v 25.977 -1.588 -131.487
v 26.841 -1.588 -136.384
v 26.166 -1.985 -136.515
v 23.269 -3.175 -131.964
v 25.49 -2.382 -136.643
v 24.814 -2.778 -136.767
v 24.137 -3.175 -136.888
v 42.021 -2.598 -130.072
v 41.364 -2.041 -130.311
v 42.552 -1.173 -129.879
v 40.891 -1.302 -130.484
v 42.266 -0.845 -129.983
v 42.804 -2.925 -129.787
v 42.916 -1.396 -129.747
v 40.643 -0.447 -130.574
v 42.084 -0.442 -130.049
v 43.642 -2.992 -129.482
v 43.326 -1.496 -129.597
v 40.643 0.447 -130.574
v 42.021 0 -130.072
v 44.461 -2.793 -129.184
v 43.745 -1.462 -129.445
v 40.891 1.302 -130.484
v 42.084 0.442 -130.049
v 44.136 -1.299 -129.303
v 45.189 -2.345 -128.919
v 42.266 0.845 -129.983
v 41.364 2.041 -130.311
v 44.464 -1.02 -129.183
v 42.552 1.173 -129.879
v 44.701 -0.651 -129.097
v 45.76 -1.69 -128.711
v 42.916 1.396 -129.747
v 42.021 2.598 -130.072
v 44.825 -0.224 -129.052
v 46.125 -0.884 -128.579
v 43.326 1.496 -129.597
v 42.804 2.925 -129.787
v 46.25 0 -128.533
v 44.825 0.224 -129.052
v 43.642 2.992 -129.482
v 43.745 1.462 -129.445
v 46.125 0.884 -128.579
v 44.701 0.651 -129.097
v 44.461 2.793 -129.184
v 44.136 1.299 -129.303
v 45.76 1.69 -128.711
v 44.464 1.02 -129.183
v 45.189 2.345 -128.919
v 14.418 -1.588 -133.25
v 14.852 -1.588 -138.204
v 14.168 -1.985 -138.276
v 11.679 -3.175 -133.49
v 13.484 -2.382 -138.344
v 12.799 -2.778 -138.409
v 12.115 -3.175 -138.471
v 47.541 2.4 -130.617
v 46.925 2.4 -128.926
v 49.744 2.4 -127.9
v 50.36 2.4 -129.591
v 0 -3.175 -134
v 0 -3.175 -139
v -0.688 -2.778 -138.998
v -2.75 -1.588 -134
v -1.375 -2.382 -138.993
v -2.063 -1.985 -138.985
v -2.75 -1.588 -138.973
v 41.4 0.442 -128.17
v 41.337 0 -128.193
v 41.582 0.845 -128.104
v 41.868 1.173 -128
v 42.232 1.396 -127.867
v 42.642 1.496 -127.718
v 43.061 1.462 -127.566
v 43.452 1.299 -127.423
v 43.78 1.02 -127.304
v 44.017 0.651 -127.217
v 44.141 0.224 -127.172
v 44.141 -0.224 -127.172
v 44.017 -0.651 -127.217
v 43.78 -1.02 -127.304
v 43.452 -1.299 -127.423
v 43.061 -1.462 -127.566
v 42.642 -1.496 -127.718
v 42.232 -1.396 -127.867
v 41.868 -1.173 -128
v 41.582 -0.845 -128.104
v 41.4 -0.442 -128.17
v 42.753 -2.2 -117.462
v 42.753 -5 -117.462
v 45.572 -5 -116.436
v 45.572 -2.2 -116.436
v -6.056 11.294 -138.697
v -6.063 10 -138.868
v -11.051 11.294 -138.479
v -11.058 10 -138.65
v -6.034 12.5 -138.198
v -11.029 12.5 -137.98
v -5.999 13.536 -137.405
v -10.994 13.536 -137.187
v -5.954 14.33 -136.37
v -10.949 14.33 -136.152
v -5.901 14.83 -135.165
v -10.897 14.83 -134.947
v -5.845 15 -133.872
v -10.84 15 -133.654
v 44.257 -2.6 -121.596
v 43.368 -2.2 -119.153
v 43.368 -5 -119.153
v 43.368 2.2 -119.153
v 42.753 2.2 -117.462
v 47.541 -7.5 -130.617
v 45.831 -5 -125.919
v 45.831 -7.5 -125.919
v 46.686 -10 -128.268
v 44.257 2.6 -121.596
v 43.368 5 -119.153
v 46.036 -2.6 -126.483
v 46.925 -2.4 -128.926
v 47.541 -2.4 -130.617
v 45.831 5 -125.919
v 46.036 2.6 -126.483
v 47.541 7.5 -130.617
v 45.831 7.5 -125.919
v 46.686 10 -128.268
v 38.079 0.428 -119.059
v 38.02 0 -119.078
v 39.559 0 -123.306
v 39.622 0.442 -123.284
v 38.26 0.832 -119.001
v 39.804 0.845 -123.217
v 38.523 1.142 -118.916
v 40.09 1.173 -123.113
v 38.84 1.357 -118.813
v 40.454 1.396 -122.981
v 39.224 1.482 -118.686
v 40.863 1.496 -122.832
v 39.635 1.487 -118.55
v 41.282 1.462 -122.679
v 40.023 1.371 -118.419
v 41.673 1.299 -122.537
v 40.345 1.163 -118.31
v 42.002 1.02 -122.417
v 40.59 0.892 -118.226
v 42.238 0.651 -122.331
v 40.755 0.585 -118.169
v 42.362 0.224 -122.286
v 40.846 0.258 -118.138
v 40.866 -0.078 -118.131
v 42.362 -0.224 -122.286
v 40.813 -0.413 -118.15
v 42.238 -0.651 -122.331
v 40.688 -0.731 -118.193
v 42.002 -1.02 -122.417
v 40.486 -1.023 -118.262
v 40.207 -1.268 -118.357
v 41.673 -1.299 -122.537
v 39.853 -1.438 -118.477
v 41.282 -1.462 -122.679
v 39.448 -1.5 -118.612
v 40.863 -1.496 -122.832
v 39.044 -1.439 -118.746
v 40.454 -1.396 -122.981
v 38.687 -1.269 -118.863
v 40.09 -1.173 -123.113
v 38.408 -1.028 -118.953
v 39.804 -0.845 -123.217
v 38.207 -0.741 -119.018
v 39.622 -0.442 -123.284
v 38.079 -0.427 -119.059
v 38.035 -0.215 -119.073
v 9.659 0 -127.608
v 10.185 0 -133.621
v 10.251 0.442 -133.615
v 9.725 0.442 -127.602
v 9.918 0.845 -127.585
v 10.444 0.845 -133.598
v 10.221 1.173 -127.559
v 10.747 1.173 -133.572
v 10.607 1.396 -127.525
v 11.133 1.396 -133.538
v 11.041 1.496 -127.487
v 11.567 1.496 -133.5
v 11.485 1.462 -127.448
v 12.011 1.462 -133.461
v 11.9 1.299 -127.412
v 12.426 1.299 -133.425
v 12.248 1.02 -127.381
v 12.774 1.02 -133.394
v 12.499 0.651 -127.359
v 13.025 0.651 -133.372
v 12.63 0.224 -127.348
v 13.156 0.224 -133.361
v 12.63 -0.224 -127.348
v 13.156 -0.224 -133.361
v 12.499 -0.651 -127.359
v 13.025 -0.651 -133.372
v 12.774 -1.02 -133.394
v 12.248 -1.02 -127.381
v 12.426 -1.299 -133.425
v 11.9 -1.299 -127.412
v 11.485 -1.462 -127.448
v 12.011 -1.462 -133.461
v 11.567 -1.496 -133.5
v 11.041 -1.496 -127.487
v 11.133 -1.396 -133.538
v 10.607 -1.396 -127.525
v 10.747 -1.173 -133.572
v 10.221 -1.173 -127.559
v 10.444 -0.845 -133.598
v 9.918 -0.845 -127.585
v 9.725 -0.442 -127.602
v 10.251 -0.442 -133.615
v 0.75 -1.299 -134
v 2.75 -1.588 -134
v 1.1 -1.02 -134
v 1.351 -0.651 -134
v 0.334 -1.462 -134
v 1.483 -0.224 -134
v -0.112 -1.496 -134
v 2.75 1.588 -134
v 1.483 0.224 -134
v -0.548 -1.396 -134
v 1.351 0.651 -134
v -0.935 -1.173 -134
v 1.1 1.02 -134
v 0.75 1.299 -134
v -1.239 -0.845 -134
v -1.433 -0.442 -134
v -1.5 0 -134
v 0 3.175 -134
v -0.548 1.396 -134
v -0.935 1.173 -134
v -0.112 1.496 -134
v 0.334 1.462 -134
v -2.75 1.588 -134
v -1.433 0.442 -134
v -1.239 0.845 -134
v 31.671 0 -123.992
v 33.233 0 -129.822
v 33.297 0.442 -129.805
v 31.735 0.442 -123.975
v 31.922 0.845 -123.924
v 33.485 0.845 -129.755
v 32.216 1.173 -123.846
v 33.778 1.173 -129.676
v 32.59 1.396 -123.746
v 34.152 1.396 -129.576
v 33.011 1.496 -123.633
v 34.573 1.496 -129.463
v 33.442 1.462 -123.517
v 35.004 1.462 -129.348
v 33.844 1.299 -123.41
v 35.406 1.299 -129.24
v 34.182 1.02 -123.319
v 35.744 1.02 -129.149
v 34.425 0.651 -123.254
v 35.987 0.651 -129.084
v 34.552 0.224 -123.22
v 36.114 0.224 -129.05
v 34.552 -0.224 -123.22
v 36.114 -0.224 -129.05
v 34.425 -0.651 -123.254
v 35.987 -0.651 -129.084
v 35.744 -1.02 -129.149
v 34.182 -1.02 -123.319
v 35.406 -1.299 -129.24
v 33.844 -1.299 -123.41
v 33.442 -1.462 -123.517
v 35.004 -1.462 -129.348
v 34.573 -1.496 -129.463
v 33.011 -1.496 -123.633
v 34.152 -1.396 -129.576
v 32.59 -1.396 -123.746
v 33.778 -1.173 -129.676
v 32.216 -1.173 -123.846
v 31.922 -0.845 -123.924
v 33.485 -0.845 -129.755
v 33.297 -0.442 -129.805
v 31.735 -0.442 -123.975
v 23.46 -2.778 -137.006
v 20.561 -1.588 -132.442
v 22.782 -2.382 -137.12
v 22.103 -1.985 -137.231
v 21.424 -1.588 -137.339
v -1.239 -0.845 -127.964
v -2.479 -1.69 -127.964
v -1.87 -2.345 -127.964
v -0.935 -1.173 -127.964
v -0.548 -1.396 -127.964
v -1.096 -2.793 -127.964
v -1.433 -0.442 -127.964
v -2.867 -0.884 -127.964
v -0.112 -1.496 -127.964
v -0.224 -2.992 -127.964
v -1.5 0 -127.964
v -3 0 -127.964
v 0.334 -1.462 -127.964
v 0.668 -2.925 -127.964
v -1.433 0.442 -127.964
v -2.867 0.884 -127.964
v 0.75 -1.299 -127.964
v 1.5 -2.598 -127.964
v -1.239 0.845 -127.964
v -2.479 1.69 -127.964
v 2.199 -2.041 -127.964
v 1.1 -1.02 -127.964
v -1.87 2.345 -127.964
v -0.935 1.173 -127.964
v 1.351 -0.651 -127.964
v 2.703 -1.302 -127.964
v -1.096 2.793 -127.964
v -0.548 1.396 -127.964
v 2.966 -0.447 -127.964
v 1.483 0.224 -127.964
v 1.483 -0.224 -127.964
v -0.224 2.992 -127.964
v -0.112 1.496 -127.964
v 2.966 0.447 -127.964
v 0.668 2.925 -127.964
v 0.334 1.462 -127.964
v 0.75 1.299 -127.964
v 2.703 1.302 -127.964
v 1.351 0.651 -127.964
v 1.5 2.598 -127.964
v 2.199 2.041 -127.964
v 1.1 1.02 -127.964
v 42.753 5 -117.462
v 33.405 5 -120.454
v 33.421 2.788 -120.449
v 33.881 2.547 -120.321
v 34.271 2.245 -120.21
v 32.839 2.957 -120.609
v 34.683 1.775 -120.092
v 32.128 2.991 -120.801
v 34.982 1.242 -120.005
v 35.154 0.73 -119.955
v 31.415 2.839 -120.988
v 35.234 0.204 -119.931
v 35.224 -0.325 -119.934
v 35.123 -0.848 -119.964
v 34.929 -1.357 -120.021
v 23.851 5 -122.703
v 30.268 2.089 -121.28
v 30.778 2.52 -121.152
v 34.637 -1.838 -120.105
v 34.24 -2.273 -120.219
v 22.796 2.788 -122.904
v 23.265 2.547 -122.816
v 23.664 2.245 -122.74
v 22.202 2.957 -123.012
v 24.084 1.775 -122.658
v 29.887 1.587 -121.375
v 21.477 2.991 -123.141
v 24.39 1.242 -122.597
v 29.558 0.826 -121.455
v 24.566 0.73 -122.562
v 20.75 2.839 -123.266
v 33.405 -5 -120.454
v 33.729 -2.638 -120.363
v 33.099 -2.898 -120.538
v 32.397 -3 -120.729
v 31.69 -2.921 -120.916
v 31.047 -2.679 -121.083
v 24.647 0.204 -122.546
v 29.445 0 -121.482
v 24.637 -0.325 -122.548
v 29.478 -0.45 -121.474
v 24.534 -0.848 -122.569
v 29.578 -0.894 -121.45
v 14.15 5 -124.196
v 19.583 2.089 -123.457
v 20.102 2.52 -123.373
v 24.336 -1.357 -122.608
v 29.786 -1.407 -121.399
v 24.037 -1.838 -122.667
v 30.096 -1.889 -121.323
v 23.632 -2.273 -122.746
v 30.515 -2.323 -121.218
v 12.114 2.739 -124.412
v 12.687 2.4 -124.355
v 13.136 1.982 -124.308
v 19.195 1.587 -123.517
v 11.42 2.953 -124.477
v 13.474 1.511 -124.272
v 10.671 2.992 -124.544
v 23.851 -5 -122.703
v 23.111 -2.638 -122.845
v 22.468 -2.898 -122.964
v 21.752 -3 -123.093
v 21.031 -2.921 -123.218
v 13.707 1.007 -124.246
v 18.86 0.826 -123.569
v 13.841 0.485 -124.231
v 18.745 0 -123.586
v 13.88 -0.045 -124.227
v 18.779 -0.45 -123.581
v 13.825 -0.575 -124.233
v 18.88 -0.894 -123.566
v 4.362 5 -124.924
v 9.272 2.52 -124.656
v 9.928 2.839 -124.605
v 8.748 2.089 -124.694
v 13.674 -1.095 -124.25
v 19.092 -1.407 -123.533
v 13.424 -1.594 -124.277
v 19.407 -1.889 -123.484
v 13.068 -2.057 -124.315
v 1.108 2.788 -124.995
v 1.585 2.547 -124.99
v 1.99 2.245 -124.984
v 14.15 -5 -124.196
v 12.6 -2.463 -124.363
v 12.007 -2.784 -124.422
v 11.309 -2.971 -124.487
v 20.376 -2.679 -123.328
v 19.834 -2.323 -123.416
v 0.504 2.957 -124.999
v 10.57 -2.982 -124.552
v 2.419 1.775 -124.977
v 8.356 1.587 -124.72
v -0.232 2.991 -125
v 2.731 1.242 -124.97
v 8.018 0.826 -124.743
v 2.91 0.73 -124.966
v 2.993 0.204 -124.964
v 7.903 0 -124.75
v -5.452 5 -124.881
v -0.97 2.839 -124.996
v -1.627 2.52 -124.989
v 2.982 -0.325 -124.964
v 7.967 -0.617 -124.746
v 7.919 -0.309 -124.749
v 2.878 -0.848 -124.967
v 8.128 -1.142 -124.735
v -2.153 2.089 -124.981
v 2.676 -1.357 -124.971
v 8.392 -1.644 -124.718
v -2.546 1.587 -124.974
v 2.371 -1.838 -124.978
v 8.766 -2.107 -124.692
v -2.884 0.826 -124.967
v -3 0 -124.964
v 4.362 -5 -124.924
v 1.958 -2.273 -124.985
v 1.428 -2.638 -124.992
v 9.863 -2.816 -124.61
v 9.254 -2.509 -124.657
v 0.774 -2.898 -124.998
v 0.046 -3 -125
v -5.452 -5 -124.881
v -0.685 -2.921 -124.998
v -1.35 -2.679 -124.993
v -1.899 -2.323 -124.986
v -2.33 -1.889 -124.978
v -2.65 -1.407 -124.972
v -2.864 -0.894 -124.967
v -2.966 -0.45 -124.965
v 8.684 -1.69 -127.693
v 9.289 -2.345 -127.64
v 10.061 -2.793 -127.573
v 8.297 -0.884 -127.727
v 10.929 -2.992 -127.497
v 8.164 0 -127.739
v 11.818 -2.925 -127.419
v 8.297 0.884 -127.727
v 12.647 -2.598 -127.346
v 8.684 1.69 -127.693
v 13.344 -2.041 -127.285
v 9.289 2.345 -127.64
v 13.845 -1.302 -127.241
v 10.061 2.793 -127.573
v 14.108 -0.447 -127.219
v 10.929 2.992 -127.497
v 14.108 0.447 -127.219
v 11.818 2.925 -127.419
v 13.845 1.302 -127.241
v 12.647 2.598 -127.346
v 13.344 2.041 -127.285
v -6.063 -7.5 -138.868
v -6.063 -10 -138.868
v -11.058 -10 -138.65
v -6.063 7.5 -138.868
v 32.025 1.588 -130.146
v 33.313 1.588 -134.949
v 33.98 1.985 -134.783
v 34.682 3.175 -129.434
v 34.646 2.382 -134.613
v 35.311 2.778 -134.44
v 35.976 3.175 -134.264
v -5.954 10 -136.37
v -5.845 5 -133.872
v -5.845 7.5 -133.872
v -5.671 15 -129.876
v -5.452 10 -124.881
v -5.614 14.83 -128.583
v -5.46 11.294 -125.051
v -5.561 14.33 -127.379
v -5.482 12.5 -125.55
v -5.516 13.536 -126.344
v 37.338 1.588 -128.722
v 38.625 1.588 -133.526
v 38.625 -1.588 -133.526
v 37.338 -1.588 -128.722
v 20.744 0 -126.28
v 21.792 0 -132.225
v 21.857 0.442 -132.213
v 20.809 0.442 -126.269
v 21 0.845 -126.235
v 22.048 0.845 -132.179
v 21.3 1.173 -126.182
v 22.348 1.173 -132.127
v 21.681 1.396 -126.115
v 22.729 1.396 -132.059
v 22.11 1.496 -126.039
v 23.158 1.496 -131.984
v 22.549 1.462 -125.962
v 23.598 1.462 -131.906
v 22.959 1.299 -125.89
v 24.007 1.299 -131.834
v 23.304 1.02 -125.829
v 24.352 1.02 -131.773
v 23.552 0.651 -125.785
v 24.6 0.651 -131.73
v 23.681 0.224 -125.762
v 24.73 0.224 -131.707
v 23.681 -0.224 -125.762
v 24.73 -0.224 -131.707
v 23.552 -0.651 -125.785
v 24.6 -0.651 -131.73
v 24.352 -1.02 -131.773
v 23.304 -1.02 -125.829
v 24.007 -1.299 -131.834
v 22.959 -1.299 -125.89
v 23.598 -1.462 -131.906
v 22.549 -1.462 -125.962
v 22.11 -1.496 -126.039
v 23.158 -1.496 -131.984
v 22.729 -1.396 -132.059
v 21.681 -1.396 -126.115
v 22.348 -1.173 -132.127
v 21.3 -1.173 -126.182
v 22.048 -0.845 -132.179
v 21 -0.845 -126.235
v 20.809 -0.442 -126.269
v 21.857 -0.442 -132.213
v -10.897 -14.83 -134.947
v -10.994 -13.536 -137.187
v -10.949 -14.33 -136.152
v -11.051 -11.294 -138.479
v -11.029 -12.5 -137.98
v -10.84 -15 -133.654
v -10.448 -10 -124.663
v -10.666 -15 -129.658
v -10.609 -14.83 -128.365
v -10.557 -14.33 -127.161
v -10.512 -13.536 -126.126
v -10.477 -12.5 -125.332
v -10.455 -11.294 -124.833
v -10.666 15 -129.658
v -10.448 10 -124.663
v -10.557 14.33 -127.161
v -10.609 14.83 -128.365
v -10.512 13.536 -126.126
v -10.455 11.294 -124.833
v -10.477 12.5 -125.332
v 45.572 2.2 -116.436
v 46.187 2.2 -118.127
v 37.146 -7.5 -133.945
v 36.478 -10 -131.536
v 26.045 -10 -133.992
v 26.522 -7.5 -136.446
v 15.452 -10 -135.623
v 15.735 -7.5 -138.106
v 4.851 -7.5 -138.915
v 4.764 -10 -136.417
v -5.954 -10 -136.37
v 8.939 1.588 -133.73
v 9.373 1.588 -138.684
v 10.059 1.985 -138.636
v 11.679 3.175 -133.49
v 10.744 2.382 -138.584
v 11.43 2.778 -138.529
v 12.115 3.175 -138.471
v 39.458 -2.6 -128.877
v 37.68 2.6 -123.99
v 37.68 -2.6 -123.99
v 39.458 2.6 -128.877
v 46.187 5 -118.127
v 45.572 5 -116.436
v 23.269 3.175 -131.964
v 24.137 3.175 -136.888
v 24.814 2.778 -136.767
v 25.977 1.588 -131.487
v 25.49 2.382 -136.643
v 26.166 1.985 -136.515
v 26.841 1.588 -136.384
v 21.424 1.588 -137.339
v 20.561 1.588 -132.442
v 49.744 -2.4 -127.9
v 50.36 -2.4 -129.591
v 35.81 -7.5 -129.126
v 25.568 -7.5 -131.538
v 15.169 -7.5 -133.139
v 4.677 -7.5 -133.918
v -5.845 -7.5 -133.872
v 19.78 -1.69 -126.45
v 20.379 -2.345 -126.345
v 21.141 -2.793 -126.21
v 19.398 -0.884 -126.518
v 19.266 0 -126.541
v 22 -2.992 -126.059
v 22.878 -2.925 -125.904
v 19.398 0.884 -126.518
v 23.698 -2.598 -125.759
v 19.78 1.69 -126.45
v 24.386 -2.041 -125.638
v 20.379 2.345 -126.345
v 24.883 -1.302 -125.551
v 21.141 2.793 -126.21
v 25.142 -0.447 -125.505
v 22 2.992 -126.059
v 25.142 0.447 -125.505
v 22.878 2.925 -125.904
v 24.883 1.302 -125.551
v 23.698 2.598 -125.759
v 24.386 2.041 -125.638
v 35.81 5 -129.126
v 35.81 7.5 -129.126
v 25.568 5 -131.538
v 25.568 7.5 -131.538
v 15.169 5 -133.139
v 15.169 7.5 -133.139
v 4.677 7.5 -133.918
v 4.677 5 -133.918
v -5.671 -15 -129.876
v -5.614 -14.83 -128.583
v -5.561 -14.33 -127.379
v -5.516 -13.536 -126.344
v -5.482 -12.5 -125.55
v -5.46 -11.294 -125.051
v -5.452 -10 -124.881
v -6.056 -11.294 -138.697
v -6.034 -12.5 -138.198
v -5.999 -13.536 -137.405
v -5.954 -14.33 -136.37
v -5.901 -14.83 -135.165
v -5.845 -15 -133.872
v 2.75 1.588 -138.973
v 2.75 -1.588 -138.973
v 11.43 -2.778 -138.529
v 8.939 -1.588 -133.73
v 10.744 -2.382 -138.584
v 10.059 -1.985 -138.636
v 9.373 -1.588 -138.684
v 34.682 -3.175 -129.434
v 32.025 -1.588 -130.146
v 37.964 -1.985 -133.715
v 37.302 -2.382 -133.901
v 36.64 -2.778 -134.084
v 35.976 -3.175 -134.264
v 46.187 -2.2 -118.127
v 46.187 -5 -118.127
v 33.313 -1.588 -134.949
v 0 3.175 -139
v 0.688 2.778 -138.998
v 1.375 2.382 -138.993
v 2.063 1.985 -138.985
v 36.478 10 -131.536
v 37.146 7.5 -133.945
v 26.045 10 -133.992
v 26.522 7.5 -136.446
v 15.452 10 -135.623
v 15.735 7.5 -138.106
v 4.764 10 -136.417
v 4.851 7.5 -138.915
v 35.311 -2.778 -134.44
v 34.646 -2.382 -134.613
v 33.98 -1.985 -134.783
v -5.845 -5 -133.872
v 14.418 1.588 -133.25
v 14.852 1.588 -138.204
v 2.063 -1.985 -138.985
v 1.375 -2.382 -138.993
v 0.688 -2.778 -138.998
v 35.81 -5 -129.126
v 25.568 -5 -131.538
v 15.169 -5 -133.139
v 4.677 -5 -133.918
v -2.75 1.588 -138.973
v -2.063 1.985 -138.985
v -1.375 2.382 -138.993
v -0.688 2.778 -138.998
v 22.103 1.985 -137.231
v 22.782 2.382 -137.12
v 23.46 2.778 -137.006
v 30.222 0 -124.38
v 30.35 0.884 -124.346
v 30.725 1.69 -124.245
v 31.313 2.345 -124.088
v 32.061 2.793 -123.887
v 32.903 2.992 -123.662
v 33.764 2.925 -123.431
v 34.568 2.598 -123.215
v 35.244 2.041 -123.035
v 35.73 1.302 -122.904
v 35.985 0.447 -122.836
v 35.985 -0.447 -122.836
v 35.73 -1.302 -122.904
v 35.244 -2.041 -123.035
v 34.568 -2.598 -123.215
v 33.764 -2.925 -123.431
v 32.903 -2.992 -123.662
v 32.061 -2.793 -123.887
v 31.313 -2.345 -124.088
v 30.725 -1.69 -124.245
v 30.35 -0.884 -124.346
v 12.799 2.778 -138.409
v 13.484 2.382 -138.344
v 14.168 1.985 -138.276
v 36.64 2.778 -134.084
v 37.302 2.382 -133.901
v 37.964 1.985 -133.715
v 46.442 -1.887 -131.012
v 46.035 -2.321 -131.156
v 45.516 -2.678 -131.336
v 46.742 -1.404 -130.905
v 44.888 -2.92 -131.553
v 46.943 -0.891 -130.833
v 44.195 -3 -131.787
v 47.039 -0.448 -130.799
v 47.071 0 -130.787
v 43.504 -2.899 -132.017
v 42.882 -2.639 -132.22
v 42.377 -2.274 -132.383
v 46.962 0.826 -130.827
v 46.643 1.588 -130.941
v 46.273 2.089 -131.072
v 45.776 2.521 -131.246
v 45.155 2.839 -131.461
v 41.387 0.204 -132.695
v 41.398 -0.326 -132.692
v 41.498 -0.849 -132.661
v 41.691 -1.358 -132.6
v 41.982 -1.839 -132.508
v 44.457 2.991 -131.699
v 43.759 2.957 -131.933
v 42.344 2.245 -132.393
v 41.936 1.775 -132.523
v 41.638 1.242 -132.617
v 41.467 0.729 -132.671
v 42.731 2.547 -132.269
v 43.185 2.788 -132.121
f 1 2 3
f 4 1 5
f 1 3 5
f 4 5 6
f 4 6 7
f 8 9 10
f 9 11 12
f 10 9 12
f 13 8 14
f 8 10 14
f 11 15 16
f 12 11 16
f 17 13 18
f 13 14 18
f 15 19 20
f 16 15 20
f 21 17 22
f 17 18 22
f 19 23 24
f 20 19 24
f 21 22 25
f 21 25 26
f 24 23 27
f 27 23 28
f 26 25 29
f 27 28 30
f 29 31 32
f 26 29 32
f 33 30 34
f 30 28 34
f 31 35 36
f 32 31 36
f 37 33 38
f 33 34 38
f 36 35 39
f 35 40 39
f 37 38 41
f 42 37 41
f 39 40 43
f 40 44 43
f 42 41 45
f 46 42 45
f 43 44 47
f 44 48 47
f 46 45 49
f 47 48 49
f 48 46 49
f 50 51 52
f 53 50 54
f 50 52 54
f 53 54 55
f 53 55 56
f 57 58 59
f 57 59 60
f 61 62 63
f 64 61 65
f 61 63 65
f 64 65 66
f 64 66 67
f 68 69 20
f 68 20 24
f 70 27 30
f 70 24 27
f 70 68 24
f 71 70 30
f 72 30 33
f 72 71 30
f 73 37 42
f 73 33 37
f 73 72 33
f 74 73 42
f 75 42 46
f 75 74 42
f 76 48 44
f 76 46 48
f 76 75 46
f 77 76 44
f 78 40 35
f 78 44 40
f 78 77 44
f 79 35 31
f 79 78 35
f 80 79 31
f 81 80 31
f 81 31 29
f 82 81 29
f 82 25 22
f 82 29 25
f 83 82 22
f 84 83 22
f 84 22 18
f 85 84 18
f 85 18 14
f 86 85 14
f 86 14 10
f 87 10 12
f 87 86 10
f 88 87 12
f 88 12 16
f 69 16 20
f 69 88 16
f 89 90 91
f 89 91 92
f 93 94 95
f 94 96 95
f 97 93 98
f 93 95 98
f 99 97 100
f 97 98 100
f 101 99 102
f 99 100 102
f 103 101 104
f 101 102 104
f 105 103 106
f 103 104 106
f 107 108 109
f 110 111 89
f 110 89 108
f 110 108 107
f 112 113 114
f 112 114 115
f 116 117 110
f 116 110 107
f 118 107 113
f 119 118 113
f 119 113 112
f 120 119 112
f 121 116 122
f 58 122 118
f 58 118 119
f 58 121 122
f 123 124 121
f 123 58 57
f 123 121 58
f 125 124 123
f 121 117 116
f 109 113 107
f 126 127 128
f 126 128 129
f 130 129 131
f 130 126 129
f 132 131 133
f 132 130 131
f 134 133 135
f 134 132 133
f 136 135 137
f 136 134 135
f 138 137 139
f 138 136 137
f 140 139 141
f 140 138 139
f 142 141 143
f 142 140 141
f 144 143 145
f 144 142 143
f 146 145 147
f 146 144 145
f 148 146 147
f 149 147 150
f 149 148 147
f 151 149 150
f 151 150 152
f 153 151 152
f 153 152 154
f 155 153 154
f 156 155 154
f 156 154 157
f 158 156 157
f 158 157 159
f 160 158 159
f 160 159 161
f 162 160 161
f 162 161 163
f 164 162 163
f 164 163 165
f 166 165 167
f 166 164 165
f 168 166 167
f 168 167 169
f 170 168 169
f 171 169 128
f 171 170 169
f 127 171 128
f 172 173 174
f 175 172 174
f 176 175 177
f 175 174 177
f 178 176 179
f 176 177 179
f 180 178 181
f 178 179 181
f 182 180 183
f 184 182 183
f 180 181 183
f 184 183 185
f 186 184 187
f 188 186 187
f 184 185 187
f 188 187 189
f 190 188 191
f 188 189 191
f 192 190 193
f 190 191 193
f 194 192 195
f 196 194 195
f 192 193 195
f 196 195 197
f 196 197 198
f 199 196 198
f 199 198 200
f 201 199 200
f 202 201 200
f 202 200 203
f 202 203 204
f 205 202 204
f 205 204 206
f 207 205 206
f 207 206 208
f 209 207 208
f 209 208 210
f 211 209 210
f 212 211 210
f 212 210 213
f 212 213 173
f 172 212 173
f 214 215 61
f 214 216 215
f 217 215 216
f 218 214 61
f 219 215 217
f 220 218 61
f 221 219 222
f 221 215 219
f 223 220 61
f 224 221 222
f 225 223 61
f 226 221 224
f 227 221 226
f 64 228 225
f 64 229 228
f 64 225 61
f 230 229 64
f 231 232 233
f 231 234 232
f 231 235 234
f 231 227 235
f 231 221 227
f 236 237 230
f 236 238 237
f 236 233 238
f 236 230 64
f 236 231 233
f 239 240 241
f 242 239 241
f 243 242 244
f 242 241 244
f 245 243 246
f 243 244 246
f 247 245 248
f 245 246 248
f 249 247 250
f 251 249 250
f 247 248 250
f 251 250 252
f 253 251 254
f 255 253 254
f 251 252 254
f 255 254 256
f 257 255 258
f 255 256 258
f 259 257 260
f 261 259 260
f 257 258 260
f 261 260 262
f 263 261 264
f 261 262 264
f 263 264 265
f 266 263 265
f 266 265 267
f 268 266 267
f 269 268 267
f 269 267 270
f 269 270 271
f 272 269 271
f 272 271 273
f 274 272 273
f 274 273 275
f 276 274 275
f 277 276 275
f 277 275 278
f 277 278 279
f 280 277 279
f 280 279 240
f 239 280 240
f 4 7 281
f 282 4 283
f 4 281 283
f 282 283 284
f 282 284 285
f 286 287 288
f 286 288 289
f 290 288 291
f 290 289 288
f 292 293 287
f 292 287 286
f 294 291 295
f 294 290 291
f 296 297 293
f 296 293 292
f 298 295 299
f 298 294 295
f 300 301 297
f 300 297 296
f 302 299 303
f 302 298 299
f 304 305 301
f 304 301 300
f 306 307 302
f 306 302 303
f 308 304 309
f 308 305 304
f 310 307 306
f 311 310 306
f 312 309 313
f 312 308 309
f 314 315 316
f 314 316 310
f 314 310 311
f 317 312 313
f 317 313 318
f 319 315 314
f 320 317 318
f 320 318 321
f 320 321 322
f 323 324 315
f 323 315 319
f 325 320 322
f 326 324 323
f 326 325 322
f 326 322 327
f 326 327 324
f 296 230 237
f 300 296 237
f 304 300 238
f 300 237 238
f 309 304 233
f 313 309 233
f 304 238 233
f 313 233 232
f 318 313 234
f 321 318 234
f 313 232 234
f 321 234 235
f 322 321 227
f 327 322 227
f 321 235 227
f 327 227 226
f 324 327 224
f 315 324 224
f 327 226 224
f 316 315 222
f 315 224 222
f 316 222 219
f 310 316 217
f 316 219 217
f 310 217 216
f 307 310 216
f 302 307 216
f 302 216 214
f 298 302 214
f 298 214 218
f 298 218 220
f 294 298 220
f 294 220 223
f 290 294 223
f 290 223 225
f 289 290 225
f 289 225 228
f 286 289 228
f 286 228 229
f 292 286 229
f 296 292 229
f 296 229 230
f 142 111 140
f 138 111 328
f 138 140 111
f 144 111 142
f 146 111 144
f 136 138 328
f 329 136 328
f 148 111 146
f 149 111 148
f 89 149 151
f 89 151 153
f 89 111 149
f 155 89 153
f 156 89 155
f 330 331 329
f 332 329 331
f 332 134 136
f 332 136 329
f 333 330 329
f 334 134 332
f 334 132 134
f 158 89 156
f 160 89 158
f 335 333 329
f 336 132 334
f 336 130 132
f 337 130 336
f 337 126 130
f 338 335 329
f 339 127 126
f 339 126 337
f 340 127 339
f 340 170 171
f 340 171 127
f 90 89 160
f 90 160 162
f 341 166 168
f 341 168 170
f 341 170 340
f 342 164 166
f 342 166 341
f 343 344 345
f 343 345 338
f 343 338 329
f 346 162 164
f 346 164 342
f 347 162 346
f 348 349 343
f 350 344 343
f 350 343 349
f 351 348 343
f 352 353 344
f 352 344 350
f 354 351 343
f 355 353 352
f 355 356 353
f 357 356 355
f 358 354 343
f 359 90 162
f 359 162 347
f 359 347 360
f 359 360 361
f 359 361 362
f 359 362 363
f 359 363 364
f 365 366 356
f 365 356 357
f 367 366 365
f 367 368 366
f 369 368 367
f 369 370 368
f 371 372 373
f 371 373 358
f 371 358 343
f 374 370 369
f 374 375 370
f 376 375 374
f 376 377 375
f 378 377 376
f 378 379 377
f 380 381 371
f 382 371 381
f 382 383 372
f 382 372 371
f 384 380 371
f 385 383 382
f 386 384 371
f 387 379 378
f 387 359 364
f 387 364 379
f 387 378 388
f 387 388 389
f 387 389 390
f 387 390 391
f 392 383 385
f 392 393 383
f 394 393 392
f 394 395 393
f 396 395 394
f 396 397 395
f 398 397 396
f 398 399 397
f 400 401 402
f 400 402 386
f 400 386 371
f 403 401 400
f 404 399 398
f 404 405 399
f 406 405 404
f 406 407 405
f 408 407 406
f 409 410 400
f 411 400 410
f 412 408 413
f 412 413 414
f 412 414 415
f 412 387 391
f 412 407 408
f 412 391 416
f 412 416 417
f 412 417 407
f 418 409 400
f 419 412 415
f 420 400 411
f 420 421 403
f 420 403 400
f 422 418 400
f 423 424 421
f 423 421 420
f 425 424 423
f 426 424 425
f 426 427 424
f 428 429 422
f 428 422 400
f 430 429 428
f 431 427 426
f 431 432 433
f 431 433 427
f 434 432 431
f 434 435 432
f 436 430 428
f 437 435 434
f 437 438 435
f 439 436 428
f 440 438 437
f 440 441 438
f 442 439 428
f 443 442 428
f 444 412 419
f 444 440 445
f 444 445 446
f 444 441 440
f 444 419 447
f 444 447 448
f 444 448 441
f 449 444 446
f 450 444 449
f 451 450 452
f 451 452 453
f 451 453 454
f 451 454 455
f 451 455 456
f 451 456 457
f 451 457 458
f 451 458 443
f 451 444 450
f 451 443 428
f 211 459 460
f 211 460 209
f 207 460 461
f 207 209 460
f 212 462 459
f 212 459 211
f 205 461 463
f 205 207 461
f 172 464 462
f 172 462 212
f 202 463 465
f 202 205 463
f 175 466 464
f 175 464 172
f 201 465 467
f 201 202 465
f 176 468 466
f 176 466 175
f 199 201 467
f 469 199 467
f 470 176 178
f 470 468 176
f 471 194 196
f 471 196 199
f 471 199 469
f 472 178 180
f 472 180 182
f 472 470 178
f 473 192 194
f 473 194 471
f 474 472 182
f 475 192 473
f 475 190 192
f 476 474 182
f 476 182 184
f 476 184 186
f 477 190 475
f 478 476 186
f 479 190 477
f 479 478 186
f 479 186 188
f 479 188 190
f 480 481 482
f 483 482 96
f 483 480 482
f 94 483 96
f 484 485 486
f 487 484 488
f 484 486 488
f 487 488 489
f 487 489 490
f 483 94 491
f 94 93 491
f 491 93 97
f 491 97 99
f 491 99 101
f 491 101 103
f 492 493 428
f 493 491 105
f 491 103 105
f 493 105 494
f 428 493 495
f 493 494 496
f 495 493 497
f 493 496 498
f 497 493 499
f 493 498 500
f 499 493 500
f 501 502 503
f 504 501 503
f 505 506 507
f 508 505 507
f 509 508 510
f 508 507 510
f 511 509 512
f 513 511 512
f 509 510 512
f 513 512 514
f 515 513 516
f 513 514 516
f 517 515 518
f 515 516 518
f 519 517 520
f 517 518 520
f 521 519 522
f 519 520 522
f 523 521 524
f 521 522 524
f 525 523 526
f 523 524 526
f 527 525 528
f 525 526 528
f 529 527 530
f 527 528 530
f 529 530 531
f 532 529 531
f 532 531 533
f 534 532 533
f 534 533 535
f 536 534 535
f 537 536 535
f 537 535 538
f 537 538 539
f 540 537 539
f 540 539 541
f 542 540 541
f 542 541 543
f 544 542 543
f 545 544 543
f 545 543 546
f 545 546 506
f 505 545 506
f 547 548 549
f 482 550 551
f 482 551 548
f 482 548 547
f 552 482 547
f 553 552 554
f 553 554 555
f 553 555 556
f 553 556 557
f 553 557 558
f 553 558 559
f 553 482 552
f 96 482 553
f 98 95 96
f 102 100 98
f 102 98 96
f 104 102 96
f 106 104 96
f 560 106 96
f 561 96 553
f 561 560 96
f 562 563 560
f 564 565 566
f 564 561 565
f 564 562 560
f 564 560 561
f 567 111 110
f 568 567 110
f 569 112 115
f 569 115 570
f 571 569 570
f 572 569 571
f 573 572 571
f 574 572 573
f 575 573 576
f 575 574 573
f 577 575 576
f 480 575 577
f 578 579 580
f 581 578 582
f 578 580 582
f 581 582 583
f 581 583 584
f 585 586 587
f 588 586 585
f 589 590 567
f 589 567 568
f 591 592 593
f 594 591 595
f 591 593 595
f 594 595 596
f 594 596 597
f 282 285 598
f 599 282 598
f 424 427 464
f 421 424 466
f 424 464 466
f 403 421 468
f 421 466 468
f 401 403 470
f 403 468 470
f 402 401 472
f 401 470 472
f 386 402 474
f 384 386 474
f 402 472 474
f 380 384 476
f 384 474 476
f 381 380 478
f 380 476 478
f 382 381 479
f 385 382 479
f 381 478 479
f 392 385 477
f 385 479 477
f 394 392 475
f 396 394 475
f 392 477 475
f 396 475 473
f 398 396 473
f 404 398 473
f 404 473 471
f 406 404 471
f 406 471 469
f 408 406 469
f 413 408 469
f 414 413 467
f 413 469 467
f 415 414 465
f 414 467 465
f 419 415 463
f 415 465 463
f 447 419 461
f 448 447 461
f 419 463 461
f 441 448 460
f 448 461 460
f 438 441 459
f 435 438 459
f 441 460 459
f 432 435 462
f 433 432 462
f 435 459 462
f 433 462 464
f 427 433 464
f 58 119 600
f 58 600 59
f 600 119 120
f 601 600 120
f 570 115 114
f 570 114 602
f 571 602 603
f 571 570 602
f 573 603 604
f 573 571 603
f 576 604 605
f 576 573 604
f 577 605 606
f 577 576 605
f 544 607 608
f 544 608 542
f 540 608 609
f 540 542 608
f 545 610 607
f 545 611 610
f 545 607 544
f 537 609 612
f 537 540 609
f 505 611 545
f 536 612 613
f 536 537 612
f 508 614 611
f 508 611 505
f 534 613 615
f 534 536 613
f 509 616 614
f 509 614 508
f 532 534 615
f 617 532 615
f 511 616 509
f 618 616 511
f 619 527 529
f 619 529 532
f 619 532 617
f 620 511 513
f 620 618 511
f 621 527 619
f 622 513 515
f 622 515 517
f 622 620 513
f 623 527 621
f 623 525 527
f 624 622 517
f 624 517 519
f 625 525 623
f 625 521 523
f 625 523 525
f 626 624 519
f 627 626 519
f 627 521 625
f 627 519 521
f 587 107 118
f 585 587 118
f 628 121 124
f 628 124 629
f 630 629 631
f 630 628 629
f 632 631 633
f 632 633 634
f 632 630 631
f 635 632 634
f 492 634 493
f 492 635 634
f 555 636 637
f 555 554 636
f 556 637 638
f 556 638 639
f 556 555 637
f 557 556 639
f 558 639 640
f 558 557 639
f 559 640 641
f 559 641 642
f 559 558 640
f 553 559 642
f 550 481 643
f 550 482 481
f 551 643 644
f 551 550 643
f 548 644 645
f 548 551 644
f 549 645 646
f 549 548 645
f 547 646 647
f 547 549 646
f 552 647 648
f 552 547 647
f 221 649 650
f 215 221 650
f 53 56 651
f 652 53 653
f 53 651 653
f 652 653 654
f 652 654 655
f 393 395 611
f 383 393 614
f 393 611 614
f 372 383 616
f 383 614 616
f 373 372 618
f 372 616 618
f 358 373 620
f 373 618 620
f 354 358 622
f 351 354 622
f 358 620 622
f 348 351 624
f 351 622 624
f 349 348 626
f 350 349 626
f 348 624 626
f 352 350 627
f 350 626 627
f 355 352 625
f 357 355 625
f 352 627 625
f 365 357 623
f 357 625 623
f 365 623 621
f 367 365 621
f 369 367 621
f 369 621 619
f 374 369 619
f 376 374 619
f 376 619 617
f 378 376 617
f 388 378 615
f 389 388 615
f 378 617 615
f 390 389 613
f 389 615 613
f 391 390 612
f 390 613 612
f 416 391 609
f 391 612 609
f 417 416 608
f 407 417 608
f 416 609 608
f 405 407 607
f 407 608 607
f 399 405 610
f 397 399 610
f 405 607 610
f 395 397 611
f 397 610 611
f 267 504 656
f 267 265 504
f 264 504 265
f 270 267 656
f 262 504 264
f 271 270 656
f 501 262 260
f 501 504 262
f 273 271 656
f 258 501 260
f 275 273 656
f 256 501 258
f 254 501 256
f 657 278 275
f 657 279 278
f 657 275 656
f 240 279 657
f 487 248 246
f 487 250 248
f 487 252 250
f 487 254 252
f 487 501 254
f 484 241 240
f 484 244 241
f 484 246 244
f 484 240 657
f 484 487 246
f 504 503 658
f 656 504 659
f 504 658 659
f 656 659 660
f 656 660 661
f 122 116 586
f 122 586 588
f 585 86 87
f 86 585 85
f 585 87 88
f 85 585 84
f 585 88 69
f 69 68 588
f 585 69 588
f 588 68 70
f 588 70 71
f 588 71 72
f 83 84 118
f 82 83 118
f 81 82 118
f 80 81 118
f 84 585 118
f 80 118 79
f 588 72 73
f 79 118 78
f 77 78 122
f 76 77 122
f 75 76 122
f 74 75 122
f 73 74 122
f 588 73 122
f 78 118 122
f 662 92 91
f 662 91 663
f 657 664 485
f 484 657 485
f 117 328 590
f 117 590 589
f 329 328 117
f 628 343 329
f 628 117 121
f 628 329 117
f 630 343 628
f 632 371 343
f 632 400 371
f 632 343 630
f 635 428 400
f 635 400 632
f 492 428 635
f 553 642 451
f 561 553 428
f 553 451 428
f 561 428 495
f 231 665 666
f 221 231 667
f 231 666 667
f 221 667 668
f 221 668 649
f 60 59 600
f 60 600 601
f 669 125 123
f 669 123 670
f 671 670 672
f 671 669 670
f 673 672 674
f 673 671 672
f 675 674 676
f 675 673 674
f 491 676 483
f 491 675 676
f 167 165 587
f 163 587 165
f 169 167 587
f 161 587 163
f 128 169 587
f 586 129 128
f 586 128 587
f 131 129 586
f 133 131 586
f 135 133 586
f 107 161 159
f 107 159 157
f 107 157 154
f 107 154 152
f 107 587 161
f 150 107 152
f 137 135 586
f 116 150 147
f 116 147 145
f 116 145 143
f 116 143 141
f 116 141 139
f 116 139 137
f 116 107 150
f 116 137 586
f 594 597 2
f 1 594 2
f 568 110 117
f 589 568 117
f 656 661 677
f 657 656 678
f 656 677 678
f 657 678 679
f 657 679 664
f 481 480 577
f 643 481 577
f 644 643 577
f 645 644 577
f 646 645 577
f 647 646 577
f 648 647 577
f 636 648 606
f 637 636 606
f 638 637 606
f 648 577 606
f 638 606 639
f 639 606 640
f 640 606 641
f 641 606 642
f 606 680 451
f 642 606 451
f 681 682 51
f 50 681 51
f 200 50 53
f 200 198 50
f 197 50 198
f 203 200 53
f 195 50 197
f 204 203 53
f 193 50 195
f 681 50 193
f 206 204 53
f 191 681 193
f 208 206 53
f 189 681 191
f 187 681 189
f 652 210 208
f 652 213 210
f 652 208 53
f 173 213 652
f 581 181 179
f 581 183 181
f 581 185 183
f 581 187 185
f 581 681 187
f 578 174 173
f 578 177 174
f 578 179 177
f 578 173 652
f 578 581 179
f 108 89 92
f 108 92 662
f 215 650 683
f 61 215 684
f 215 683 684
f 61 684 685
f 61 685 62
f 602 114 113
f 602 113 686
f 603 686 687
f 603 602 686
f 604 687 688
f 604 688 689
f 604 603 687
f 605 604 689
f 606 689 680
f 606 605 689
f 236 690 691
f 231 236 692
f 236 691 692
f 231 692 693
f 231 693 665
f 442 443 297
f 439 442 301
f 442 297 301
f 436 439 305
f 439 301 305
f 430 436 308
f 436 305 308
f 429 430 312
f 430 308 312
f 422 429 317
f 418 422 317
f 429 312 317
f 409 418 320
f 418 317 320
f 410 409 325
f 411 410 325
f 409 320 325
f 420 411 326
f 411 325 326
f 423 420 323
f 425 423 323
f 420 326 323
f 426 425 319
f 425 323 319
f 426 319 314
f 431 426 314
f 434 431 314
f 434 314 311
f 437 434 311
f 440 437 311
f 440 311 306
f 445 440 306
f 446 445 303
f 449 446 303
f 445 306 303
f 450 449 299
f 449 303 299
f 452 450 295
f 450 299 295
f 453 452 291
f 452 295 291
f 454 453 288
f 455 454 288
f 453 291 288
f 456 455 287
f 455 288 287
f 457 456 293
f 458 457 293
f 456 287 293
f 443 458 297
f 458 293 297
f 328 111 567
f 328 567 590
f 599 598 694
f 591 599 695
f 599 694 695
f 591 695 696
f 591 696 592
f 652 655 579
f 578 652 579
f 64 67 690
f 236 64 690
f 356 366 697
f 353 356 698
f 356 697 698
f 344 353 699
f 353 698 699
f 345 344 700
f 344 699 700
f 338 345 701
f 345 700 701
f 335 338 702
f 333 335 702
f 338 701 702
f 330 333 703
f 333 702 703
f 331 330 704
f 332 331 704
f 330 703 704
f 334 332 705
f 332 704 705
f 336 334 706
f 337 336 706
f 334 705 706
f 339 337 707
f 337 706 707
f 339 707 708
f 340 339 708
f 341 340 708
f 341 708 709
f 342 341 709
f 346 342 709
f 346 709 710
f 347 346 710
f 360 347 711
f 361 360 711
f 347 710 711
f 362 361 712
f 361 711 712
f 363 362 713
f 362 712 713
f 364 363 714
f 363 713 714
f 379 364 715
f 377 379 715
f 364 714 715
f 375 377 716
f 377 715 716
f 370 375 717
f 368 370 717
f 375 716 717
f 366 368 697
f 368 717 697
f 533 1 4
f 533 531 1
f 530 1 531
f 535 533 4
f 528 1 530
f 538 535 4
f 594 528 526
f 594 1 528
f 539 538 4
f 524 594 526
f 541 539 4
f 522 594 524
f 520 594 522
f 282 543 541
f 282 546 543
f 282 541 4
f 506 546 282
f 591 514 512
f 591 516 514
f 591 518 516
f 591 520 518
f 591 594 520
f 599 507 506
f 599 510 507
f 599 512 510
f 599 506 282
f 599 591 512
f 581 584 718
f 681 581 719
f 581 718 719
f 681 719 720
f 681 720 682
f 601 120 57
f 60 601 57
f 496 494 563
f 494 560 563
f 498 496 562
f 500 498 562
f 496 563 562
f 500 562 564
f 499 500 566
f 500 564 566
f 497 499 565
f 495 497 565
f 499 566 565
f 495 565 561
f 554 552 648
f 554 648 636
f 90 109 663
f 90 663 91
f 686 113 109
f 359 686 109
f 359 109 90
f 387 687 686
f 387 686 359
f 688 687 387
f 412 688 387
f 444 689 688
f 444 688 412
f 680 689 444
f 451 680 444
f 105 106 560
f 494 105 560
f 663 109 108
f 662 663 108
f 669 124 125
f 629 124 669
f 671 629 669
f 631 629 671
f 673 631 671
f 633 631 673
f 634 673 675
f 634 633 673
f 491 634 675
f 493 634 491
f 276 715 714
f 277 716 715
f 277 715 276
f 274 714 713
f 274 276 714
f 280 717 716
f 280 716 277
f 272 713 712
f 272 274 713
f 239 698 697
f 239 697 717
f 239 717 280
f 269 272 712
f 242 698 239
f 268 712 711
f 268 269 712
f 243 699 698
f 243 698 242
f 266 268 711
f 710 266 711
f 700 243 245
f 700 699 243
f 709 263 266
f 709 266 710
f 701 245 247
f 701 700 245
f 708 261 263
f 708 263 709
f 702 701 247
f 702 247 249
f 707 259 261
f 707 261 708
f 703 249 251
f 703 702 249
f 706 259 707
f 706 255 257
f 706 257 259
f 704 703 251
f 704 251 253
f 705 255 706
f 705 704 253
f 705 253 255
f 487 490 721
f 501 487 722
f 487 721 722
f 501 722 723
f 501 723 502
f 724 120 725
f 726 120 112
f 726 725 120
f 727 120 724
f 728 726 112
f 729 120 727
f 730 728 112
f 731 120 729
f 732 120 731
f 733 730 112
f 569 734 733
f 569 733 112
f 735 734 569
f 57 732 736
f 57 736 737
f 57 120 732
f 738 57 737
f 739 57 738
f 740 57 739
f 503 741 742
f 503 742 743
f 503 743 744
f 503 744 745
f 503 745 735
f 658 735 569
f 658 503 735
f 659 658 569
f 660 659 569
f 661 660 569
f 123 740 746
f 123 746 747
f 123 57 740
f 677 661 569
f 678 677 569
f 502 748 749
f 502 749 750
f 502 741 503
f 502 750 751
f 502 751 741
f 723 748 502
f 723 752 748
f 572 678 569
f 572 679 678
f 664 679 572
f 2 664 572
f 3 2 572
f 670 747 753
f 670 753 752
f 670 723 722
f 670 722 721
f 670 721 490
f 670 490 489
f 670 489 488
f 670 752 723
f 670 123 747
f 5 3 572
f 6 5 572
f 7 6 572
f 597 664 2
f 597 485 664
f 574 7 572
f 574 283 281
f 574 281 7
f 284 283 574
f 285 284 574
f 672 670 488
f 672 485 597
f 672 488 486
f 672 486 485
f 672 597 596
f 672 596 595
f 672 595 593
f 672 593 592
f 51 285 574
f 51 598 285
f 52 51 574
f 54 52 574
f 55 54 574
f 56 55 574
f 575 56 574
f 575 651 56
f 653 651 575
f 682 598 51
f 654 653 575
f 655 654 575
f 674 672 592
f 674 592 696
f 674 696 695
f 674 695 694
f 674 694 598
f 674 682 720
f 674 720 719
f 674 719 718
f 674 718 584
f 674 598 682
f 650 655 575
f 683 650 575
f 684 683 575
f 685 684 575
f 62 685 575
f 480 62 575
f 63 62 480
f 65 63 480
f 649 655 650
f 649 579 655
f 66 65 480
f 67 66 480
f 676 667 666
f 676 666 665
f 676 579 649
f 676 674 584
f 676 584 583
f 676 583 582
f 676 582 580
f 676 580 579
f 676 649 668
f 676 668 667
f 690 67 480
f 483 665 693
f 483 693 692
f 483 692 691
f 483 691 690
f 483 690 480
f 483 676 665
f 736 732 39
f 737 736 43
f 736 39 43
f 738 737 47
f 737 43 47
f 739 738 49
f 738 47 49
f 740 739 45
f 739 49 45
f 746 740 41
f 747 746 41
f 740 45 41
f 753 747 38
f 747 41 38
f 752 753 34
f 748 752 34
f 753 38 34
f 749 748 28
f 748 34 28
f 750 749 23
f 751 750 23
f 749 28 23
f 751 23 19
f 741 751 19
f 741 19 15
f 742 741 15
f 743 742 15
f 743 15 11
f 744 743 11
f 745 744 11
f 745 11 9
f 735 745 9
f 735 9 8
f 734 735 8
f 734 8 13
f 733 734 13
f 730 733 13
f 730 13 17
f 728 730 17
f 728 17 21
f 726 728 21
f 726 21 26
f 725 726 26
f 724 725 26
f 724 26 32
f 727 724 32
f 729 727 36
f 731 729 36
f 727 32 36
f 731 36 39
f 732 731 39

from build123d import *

# Parameters (mm, degrees)
REVOLVE_1_ANGLE          = 40
SKETCH_3_W               = 5.2
SKETCH_3_H               = 5.2
CUT_EXTRUDE_1_DEPTH      = 7
CUT_EXTRUDE_2_DEPTH      = 94.967026614
CUT_EXTRUDE_2_DEPTH_BACK = 94.967026614
SKETCH_5_R               = 1.5
CUT_EXTRUDE_START        = -2
SKETCH_6_R               = 3
CUT_EXTRUDE_3_DEPTH      = 93.938324905
SKETCH_12_R              = 1.5
CUT_EXTRUDE_5_DEPTH      = 54.141615619
CUT_EXTRUDE_6_DEPTH      = 5
SKETCH_14_W              = 3
SKETCH_14_H              = 3
PATTERN_CIRCULAR_1_COUNT = 4
PATTERN_CIRCULAR_1_ANGLE = 15
F_1_THE_OTHER_WAY_COUNT  = 4
F_1_THE_OTHER_WAY_ANGLE  = 15
SKETCH_9_W               = 1.8
SKETCH_9_H               = 4.8
SKETCH_9_H_2             = 2.8
EXTRUDE_2_DEPTH          = 3
SKETCH_10_W              = 52.448370613
SKETCH_10_H              = 39.953744926
CUT_EXTRUDE_4_DEPTH      = 149.179341739
SKETCH_11_W              = 14
SKETCH_11_H              = 30
EXTRUDE_3_DEPTH          = 5
FILLET_1_R               = 5


# Read off the part's stored shape, not the designer's step: 旋转1
with BuildPart() as part:
    # 旋转1 outline → 旋转1 (revolve)
    with BuildSketch(Plane(origin=(0, 0, 0), x_dir=(0.3420201433256701, 0, -0.9396926207859079), z_dir=(0.9396926207859079, 0, 0.3420201433256701))):
        Polygon((134, 5), (125, 5), (125, -5), (134, -5), (134, -7.5), (136.5, -10), (139, -7.5), (139, 7.5), (136.5, 10), (134, 7.5), align=None)
    revolve(axis=Axis((0, 0, 0), (0, 1, 0)), revolution_arc=REVOLVE_1_ANGLE)

    # 草图3 → 切除-拉伸1 (cut)
    with BuildSketch(Plane(origin=(0, 0, 0), x_dir=(0.34202014332566943, 0, -0.9396926207859081), z_dir=(0.9396926207859081, 0, 0.34202014332566943))):
        with Locations((132, 0)):
            Rectangle(SKETCH_3_W, SKETCH_3_H)
    extrude(amount=-CUT_EXTRUDE_1_DEPTH, mode=Mode.SUBTRACT)

    # 草图5 → 切除-拉伸2 (cut, two sides: drawn at the far end of the back side and taken through both)
    with BuildSketch(Plane(origin=(44.257406546, 0, -121.59622513), x_dir=(-0.9396926207859081, 0, -0.3420201433256695), z_dir=(0.3420201433256695, 0, -0.9396926207859081)).offset(-CUT_EXTRUDE_2_DEPTH_BACK)):
        with Locations((3.5, 0)):
            Circle(SKETCH_5_R)
    extrude(amount=CUT_EXTRUDE_2_DEPTH + CUT_EXTRUDE_2_DEPTH_BACK, mode=Mode.SUBTRACT)

    # 草图6 → 切除-拉伸3 (cut, through all)
    with BuildSketch(Plane(origin=(46.035911292, 0, -126.482626758), x_dir=(0.9396926207859081, 0, 0.3420201433256695), z_dir=(-0.3420201433256695, 0, 0.9396926207859081)).offset(CUT_EXTRUDE_START)):
        with Locations((-3.5, 0)):
            Circle(SKETCH_6_R)
    extrude(amount=-CUT_EXTRUDE_3_DEPTH, mode=Mode.SUBTRACT)

    # 草图12 → 切除-拉伸5 (cut, through all)
    with BuildSketch(Plane(origin=(0, 0, -139), x_dir=(-1, 0, 0), z_dir=(0, 0, -1))):
        Circle(SKETCH_12_R)
    cut_extrude_5 = extrude(amount=-CUT_EXTRUDE_5_DEPTH, mode=Mode.SUBTRACT)

    # 草图13 → 切除-拉伸6 (cut)
    with BuildSketch(Plane(origin=(0, 0, -139), x_dir=(-1, 0, 0), z_dir=(0, 0, -1))):
        Polygon((0, -3.175426481), (2.75, -1.58771324), (2.75, 1.58771324), (0, 3.175426481), (-2.75, 1.58771324), (-2.75, -1.58771324), align=None)
    cut_extrude_6 = extrude(amount=-CUT_EXTRUDE_6_DEPTH, mode=Mode.SUBTRACT)

    # 草图14 → 切除-旋转1 (revolve, cut)
    with BuildSketch(Plane(origin=(0, 0, 0), x_dir=(1, 0, 0), z_dir=(0, 1, 0)), mode=Mode.PRIVATE) as cut_revolve_1_sk:
        with Locations((1.5, 126.463994814)):
            Rectangle(SKETCH_14_W, SKETCH_14_H)
    cut_revolve_1 = revolve(cut_revolve_1_sk.sketch.rotate(Axis((0, 0, 1000), (0, 0, -1)), 180), axis=Axis((0, 0, 1000), (0, 0, -1)), mode=Mode.SUBTRACT)

    # 阵列(圆周)1: 切除-拉伸5, 切除-拉伸6, 切除-旋转1 ×4 about axis
    pattern_circular_1_axis = Axis((0, 0, 0), (0, 1, 0))
    add([cut_extrude_5.rotate(pattern_circular_1_axis, i * PATTERN_CIRCULAR_1_ANGLE / (PATTERN_CIRCULAR_1_COUNT - 1)) for i in range(1, PATTERN_CIRCULAR_1_COUNT)], mode=Mode.SUBTRACT)
    add([cut_extrude_6.rotate(pattern_circular_1_axis, i * PATTERN_CIRCULAR_1_ANGLE / (PATTERN_CIRCULAR_1_COUNT - 1)) for i in range(1, PATTERN_CIRCULAR_1_COUNT)], mode=Mode.SUBTRACT)
    add([cut_revolve_1.rotate(pattern_circular_1_axis, i * PATTERN_CIRCULAR_1_ANGLE / (PATTERN_CIRCULAR_1_COUNT - 1)) for i in range(1, PATTERN_CIRCULAR_1_COUNT)], mode=Mode.SUBTRACT)

    # 1 the other way: 切除-拉伸5, 切除-拉伸6, 切除-旋转1 ×4 about axis
    f_1_the_other_way_axis = Axis((0, 0, 0), (0, -1, 0))
    add([cut_extrude_5.rotate(f_1_the_other_way_axis, i * F_1_THE_OTHER_WAY_ANGLE / (F_1_THE_OTHER_WAY_COUNT - 1)) for i in range(1, F_1_THE_OTHER_WAY_COUNT)], mode=Mode.SUBTRACT)
    add([cut_extrude_6.rotate(f_1_the_other_way_axis, i * F_1_THE_OTHER_WAY_ANGLE / (F_1_THE_OTHER_WAY_COUNT - 1)) for i in range(1, F_1_THE_OTHER_WAY_COUNT)], mode=Mode.SUBTRACT)
    add([cut_revolve_1.rotate(f_1_the_other_way_axis, i * F_1_THE_OTHER_WAY_ANGLE / (F_1_THE_OTHER_WAY_COUNT - 1)) for i in range(1, F_1_THE_OTHER_WAY_COUNT)], mode=Mode.SUBTRACT)

    # 草图9 → 凸台-拉伸2 (add)
    with BuildSketch(Plane(origin=(0, 0, 0), x_dir=(0.34202014332566943, 0, -0.9396926207859082), z_dir=(0.9396926207859082, 0, 0.34202014332566943))):
        with Locations((138.1, 0)):
            Rectangle(SKETCH_9_W, SKETCH_9_H)
        with Locations((125.9, 3.6)):
            Rectangle(SKETCH_9_W, SKETCH_9_H_2)
        with Locations((125.9, -3.6)):
            Rectangle(SKETCH_9_W, SKETCH_9_H_2)
    extrude(amount=EXTRUDE_2_DEPTH)

    # 草图10 → 切除-拉伸4 (cut, through all)
    with BuildSketch(Plane(origin=(0, 0, 0), x_dir=(0, -1, 0), z_dir=(0.9990482215818578, 0, -0.04361938736533606))):
        with Locations((1.816079314, 125.001454628)):
            Rectangle(SKETCH_10_W, SKETCH_10_H)
    extrude(amount=-CUT_EXTRUDE_4_DEPTH, mode=Mode.SUBTRACT)

    # 草图11 → 凸台-拉伸3 (add)
    with BuildSketch(Plane(origin=(0, 0, 0), x_dir=(0.043619387365336076, 0, 0.9990482215818578), z_dir=(-0.9990482215818577, 0, 0.04361938736533607))):
        with Locations((-132, 0)):
            Rectangle(SKETCH_11_W, SKETCH_11_H)
    extrude(amount=EXTRUDE_3_DEPTH)

    # 圆角1
    fillet_1_edges = [part.edges().sort_by_distance(p)[0] for p in [
        (-8.560715398, 15, -138.758654331),
        (-8.560715398, -15, -138.758654331),
        (-7.950043975, -15, -124.771979229),
        (-7.950043975, 15, -124.771979229),
    ]]
    fillet(fillet_1_edges, radius=FILLET_1_R)


solid = part.part
